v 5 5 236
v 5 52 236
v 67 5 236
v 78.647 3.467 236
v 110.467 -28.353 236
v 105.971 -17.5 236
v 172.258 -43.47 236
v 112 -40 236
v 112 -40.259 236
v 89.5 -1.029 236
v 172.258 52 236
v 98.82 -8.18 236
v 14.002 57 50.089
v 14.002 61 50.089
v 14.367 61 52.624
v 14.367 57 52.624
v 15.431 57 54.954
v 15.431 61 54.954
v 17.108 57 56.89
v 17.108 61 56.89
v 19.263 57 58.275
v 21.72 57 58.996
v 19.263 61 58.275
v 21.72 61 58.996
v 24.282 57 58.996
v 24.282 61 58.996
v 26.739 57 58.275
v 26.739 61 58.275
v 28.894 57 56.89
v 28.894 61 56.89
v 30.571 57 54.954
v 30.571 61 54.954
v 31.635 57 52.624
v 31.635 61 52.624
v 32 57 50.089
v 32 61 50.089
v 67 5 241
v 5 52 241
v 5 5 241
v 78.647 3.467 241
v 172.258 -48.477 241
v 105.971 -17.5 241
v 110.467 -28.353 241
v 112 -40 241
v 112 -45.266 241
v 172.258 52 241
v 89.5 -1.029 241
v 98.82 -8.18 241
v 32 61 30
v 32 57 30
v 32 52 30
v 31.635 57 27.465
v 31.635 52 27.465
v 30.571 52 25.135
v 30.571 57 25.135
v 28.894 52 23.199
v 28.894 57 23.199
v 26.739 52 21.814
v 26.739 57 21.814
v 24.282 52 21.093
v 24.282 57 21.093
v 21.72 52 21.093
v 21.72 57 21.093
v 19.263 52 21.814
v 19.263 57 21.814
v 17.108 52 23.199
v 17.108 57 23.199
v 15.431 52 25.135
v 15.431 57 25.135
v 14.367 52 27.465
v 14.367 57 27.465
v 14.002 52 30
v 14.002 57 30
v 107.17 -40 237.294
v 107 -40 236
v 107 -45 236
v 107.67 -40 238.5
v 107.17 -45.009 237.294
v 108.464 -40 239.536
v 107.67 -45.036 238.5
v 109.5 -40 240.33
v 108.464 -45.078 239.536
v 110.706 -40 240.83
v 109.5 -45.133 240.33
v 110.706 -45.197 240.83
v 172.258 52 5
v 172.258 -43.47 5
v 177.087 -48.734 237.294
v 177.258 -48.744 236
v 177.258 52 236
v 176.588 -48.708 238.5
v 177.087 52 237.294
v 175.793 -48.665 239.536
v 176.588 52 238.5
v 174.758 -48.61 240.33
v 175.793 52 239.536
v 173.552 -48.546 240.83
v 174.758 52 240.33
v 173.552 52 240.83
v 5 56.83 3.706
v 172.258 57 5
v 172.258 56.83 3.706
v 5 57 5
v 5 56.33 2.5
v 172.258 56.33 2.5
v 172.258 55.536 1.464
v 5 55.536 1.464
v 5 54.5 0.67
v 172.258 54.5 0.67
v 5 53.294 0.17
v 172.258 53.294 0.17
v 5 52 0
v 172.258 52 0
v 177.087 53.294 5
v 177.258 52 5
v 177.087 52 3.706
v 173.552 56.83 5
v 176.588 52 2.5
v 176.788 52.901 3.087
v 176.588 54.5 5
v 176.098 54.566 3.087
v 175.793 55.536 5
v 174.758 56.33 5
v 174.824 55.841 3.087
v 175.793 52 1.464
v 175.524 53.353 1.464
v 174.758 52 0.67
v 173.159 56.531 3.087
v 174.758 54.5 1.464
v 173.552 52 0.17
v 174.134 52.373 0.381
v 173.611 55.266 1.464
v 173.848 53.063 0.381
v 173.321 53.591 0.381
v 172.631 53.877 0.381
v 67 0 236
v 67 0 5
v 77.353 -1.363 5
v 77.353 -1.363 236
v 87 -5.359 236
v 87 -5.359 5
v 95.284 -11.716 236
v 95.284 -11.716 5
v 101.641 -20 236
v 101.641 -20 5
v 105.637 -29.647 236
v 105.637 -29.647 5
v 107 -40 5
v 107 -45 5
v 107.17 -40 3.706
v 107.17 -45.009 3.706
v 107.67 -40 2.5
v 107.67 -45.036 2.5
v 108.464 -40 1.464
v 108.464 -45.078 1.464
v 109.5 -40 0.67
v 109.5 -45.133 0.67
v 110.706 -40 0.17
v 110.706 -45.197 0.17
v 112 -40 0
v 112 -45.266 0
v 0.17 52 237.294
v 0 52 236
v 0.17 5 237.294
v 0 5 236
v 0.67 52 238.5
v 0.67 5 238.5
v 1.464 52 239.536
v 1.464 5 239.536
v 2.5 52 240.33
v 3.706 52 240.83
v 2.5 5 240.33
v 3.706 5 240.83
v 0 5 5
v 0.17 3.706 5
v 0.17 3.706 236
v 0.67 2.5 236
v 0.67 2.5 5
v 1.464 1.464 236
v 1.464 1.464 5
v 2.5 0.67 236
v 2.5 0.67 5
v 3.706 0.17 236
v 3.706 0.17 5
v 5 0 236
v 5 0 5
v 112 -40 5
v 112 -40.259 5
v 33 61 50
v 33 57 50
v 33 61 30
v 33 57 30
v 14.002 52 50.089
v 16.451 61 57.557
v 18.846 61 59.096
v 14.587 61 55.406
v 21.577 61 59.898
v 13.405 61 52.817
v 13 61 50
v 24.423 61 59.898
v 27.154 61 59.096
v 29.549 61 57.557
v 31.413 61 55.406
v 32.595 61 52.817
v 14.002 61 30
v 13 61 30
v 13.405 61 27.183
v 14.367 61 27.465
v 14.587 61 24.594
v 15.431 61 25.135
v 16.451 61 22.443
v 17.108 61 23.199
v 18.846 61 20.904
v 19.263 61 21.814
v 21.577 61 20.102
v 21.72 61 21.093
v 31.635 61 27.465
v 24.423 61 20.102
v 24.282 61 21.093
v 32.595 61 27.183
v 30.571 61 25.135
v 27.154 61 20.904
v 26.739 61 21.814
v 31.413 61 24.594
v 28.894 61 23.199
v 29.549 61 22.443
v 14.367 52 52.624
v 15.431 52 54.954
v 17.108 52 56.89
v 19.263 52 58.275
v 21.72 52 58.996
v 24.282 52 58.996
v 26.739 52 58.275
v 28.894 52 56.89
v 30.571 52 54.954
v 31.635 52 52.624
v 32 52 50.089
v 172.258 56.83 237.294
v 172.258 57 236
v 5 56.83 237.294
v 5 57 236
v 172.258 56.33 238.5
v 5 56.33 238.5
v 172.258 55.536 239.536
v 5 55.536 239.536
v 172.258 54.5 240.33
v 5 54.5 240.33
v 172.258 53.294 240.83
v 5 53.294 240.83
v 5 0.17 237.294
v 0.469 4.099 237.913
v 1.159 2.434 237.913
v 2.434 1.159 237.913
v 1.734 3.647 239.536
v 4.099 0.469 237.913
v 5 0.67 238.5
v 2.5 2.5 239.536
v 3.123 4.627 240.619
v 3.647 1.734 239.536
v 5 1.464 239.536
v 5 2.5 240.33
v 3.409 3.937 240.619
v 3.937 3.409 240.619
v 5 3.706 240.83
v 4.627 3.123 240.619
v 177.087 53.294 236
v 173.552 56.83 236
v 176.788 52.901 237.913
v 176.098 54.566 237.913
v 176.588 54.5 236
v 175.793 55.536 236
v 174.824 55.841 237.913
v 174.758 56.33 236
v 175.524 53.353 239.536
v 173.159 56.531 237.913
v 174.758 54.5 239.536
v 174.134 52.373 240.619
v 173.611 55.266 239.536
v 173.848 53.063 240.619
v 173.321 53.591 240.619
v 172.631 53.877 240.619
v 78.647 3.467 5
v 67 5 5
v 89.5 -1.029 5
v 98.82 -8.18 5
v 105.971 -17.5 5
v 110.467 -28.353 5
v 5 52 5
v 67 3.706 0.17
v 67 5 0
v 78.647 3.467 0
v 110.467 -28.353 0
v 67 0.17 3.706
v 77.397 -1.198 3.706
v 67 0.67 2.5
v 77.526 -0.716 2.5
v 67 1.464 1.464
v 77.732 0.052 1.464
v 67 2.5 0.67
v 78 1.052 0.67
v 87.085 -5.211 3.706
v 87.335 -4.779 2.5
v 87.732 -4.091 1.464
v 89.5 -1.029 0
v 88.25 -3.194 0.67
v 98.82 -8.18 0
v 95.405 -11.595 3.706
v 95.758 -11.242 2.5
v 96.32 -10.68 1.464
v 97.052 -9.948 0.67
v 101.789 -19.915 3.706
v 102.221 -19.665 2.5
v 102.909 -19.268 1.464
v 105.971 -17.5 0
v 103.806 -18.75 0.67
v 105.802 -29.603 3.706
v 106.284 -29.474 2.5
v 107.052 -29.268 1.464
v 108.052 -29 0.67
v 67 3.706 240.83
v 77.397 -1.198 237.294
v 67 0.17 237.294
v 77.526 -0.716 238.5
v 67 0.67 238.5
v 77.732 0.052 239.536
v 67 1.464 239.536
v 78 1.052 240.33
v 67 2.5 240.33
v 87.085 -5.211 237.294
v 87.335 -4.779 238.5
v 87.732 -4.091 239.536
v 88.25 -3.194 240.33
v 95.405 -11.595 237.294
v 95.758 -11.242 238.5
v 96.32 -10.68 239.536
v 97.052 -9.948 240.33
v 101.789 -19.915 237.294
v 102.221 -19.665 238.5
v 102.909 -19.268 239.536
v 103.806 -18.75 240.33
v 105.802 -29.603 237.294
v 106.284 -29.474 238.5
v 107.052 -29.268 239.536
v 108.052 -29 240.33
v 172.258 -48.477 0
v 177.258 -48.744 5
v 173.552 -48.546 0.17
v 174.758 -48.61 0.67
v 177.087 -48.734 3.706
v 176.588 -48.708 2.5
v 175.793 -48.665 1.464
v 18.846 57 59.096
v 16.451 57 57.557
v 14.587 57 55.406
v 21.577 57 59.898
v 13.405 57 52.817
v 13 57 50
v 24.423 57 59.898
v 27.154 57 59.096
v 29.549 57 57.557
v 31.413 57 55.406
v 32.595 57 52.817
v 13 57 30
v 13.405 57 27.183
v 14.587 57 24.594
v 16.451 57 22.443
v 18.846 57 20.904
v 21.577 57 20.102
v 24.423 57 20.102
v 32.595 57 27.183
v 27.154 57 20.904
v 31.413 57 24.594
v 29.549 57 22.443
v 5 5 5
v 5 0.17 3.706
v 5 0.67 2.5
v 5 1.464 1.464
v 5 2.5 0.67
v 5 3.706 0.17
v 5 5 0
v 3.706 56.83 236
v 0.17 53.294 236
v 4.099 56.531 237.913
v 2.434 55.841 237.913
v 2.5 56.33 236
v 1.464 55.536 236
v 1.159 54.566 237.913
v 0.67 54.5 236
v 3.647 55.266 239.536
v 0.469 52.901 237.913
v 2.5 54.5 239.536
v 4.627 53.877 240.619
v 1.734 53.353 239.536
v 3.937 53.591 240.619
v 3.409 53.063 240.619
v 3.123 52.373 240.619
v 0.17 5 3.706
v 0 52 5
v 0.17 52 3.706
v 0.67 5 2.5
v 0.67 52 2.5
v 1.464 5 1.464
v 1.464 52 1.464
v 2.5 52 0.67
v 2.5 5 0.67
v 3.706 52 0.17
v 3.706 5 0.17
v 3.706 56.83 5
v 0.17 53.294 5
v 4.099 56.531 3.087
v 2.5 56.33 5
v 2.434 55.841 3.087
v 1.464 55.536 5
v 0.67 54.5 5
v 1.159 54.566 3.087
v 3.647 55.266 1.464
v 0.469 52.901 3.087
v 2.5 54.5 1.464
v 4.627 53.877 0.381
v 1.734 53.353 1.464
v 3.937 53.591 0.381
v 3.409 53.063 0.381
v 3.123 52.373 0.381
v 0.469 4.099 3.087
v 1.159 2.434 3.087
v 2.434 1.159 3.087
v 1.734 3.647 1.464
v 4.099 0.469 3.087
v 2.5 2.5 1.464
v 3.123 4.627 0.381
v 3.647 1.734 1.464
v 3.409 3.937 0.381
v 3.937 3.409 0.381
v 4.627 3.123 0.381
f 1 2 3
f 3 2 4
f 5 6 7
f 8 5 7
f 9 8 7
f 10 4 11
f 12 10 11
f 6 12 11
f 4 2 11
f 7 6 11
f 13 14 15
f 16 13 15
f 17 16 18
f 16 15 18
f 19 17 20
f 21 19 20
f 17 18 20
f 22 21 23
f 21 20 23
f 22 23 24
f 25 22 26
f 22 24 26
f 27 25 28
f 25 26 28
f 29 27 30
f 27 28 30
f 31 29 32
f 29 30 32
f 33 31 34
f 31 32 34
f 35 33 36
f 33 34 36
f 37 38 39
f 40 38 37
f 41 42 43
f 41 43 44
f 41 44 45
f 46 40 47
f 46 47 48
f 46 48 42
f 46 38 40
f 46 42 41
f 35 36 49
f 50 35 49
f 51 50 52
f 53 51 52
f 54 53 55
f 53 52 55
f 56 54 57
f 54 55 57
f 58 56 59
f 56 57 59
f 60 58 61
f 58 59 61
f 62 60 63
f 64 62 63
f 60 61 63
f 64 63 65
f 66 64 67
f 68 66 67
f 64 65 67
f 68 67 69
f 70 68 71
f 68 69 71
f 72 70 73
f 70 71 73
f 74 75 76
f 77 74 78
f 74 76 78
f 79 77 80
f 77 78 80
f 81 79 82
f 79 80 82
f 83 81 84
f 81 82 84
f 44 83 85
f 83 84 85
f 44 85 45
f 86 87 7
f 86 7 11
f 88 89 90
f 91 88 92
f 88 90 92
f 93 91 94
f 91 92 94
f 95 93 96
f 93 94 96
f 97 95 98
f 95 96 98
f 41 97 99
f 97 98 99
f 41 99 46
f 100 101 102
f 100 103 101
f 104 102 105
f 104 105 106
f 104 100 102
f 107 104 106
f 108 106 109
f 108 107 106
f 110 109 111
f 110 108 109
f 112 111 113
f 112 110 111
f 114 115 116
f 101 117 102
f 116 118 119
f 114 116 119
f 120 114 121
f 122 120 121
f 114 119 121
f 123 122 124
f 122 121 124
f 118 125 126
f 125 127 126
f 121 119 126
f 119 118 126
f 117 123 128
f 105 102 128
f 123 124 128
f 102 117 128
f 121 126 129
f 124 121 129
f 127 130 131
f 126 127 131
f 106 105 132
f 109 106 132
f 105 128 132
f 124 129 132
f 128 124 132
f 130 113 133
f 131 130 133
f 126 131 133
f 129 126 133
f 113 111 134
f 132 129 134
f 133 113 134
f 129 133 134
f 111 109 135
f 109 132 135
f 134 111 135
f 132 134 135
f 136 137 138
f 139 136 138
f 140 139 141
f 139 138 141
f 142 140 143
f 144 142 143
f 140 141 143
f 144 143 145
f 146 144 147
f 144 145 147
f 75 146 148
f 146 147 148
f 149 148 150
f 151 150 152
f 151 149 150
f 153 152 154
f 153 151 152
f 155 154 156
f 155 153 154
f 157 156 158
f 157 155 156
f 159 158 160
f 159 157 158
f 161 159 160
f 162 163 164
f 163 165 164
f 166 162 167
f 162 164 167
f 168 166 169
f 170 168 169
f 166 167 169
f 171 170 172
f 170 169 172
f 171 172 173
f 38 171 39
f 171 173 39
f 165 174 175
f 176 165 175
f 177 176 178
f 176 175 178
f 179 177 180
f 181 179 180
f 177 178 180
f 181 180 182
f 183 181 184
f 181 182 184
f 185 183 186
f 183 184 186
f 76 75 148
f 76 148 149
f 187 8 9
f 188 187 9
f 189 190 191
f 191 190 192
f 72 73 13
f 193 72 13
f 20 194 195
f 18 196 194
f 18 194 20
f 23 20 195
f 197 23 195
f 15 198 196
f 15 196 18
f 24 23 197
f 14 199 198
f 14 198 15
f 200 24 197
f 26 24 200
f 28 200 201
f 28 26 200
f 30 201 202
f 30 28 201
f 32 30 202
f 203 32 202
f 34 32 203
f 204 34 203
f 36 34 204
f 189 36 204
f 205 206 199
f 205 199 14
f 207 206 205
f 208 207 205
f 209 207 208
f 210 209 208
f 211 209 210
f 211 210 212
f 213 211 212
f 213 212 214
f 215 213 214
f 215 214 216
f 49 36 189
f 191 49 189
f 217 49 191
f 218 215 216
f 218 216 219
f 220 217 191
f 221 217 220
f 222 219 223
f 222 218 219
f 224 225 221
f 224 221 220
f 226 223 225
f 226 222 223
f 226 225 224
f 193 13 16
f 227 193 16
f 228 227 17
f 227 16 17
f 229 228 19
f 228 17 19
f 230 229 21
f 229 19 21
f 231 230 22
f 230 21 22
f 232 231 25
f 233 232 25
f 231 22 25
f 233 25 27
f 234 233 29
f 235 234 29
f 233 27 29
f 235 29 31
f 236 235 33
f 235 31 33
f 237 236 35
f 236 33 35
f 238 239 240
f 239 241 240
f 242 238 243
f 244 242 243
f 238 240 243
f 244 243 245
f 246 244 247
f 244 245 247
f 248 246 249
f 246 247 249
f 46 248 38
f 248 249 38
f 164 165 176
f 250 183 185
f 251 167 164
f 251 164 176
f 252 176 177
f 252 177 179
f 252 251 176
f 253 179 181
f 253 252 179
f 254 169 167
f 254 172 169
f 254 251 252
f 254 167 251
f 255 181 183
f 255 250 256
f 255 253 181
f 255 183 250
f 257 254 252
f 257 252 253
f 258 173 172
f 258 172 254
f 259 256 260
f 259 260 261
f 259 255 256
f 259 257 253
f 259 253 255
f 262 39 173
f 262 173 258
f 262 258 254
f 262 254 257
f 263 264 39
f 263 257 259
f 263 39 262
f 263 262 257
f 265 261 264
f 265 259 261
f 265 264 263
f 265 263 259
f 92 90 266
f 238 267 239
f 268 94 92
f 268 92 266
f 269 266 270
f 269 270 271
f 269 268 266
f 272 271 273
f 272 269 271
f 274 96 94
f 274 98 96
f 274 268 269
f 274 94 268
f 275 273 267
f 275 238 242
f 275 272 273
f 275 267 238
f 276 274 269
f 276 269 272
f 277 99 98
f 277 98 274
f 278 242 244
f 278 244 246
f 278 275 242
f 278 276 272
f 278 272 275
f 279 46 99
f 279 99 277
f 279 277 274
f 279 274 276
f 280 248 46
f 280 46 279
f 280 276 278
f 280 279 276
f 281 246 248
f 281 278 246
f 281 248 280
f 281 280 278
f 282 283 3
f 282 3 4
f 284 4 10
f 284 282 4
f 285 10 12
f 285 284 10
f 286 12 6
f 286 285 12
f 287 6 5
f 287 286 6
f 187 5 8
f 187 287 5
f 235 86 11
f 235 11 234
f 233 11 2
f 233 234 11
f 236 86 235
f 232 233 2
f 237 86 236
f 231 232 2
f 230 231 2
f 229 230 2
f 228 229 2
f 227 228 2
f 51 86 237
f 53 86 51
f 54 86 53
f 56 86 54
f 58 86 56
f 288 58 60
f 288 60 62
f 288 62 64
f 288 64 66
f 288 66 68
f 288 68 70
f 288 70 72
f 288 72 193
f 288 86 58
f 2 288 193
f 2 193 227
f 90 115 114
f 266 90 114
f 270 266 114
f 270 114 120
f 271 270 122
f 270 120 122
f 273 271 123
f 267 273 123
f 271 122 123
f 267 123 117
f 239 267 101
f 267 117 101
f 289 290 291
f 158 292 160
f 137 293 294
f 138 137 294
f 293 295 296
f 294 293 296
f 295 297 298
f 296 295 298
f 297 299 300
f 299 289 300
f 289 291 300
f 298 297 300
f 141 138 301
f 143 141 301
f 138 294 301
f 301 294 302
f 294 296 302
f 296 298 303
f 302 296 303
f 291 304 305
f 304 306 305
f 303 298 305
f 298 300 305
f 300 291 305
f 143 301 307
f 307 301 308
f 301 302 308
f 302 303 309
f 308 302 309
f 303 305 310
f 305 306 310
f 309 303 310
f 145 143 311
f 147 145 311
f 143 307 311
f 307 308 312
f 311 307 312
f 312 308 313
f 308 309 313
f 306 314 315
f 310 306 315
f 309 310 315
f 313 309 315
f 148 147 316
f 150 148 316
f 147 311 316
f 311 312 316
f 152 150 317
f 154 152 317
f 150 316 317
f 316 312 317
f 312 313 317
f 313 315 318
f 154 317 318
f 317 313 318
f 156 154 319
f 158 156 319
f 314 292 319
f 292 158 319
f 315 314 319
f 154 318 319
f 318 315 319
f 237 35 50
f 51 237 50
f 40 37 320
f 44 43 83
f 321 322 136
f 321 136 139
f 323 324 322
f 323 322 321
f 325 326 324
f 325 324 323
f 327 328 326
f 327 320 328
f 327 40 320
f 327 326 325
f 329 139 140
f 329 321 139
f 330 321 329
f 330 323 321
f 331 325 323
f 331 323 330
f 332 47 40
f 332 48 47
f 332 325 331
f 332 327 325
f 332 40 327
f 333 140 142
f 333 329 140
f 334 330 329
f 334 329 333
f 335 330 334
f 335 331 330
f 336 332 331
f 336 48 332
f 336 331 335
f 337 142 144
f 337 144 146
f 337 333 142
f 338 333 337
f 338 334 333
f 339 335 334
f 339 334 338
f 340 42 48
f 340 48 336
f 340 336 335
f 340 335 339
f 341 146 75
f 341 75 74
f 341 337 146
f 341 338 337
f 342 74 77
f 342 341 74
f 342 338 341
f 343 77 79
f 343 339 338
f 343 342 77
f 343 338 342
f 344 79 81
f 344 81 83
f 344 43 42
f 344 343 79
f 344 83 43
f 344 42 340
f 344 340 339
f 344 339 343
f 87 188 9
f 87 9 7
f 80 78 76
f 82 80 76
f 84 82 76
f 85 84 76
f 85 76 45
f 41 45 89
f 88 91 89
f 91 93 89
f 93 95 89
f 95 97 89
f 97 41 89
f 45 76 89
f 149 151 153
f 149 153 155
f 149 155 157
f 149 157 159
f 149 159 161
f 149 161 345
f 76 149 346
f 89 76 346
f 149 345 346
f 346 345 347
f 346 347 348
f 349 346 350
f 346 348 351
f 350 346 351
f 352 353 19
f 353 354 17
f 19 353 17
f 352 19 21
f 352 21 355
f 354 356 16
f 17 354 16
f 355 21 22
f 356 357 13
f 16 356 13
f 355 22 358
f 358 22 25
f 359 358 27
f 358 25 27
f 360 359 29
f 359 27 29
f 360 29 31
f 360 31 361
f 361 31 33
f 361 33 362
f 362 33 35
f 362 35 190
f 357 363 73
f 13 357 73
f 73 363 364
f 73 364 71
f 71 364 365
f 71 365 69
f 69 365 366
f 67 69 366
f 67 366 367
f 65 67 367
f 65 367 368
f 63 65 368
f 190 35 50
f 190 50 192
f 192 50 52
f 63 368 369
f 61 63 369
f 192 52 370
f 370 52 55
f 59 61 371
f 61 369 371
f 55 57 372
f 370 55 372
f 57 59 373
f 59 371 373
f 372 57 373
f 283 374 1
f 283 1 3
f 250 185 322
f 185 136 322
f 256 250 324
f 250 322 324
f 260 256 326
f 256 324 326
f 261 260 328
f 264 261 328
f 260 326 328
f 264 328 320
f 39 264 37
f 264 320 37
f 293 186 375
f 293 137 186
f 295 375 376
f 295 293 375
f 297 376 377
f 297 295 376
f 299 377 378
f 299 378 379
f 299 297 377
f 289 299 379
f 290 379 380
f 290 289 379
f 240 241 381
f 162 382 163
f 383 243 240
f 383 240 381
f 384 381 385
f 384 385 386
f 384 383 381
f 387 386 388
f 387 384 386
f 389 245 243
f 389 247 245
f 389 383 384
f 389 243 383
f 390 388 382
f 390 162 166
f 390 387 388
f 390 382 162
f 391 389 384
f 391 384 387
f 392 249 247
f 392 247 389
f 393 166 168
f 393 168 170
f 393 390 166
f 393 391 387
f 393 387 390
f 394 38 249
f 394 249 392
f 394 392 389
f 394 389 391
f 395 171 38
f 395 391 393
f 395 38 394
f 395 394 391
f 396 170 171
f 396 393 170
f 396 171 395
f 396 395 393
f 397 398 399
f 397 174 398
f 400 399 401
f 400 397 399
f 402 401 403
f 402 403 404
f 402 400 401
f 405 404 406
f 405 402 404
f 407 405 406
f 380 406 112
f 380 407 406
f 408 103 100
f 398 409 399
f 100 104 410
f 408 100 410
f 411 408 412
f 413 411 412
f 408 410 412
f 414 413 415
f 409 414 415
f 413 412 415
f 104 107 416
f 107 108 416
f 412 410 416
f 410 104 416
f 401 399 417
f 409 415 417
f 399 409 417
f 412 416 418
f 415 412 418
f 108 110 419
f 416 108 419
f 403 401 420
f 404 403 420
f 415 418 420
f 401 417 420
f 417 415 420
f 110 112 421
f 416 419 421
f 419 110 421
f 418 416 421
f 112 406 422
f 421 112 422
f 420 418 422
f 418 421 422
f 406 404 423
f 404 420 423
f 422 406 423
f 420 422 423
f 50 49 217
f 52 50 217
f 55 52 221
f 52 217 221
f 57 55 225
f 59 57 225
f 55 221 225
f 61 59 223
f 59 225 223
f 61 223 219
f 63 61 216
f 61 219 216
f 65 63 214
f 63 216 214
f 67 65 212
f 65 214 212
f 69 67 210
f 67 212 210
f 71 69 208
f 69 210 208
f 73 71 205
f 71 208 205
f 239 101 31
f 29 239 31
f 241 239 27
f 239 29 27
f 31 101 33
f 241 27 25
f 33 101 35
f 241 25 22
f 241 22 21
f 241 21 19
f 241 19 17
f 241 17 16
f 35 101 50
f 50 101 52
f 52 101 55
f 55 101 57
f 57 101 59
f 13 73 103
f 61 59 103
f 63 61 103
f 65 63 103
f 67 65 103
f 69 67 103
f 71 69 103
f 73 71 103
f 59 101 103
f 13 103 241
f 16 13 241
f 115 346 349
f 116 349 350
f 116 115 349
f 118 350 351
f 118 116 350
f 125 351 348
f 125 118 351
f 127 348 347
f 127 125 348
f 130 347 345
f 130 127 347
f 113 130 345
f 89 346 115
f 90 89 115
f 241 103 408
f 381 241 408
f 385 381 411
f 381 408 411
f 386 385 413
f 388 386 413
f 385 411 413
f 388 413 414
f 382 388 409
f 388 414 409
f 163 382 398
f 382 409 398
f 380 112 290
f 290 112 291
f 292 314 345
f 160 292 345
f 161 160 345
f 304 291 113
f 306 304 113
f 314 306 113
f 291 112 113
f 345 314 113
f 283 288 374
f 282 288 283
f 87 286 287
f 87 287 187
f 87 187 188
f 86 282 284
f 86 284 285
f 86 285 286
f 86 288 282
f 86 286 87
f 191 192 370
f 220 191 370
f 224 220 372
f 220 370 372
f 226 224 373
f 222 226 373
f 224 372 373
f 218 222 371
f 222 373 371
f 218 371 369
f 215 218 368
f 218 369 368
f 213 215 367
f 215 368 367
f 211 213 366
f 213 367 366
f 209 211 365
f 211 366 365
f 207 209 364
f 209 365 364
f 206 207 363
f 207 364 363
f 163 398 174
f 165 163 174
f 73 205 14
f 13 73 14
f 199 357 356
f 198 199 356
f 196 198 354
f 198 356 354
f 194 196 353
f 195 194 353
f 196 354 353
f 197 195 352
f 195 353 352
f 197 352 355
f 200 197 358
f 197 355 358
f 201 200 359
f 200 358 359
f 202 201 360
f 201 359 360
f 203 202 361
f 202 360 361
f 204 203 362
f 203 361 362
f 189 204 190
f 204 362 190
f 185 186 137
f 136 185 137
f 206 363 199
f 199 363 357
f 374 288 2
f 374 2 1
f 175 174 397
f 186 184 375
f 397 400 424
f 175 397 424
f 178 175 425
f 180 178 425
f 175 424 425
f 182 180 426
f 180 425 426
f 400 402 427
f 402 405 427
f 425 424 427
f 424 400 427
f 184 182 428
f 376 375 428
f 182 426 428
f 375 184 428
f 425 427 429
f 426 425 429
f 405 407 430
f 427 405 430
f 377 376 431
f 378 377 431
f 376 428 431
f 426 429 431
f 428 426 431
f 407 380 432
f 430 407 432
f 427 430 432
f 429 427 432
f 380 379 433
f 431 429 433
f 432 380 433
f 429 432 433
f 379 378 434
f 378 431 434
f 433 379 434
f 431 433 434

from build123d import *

# Parameters (mm, degrees)
BOSS_EXTRU_1_DEPTH      = 241
CONG_1_R                = 5
BOSS_EXTRU_2_DEPTH      = 4
ENL_V_MAT_EXTRU_2_DEPTH = 9
COQUE1_START            = 5
COQUE1_DEPTH            = 231


# Read off the part's stored shape, not the designer's step: Coque1
with BuildPart() as part:
    # Esquisse1 → Boss.-Extru.1 (new body)
    with BuildSketch(Plane.XY):
        with BuildLine():
            Line((5, 0), (67, 0))
            ThreePointArc((67, 0), (95.284271247, -11.715728753), (107, -40))
            Line((107, -40), (107, -45))
            Line((107, -45), (177.257535232, -48.743523889))
            Line((177.257535232, -48.743523889), (177.257535232, 52))
            ThreePointArc((177.257535232, 52), (175.793069138, 55.535533906), (172.257535232, 57))
            Line((172.257535232, 57), (5, 57))
            ThreePointArc((5, 57), (1.464466094, 55.535533906), (0, 52))
            Line((0, 52), (0, 5))
            ThreePointArc((0, 5), (1.464466094, 1.464466094), (5, 0))
        make_face()
    extrude(amount=BOSS_EXTRU_1_DEPTH)

    # Congé1
    cong_1_edges = [part.edges().sort_by_distance(p)[0] for p in [
        (107, -42.5, 0),
        (95.284271247, -11.715728753, 0),
        (36, 0, 0),
        (1.464466094, 1.464466094, 0),
        (0, 28.5, 0),
        (1.464466094, 55.535533906, 0),
        (88.628767616, 57, 0),
        (107, -42.5, 241),
        (95.284271247, -11.715728753, 241),
        (36, 0, 241),
        (0, 28.5, 241),
        (88.628767616, 57, 241),
        (177.257535232, 1.628238056, 0),
        (177.257535232, 1.628238056, 241),
    ]]
    fillet(cong_1_edges, radius=CONG_1_R)


with BuildPart() as body_2:
    # Esquisse3 → Boss.-Extru.2 (new body)
    with BuildSketch(Plane(origin=(0, 57, 0), x_dir=(1, 0, 0), z_dir=(0, 1, 0))):
        with BuildLine():
            Line((13, -30), (13, -50))
            ThreePointArc((13, -50), (23, -60), (33, -50))
            Line((33, -50), (33, -30))
            ThreePointArc((33, -30), (23, -20), (13, -30))
        make_face()
    extrude(amount=BOSS_EXTRU_2_DEPTH)


with BuildPart() as enl_v_mat_extru_2_tool:
    # Esquisse5 → Enlèv. mat.-Extru.2 (new body)
    with BuildSketch(Plane(origin=(0, 61, 0), x_dir=(1, 0, 0), z_dir=(0, 1, 0))):
        with BuildLine():
            Line((14.002264258, -30), (14.002264258, -50.088867222))
            ThreePointArc((14.002264258, -50.088867222), (23.001132129, -59.087735093), (32, -50.088867222))
            Line((32, -50.088867222), (32, -30))
            ThreePointArc((32, -30), (23.001132129, -21.001132129), (14.002264258, -30))
        make_face()
    extrude(amount=-ENL_V_MAT_EXTRU_2_DEPTH)


with BuildPart() as part_1:
    add(part.part)

    # Enlèv. mat.-Extru.2: cut by enl_v_mat_extru_2_tool
    add(enl_v_mat_extru_2_tool.part, mode=Mode.SUBTRACT)

    # Coque1 outline → Coque1 (cut)
    with BuildSketch(Plane.XY.offset(COQUE1_START)):
        with BuildLine():
            Line((172.257535232, 52), (5, 52))
            Line((5, 52), (5, 5))
            Line((5, 5), (67, 5))
            ThreePointArc((67, 5), (98.819805153, -8.180194847), (112, -40))
            Line((112, -40), (112, -40.259321772))
            Line((112, -40.259321772), (172.257535232, -43.470016851))
            Line((172.257535232, -43.470016851), (172.257535232, 52))
        make_face()
    extrude(amount=COQUE1_DEPTH, mode=Mode.SUBTRACT)


with BuildPart() as body_2_1:
    add(body_2.part)

    # Enlèv. mat.-Extru.2: cut by enl_v_mat_extru_2_tool
    add(enl_v_mat_extru_2_tool.part, mode=Mode.SUBTRACT)


solid = Compound([part_1.part, body_2_1.part])
